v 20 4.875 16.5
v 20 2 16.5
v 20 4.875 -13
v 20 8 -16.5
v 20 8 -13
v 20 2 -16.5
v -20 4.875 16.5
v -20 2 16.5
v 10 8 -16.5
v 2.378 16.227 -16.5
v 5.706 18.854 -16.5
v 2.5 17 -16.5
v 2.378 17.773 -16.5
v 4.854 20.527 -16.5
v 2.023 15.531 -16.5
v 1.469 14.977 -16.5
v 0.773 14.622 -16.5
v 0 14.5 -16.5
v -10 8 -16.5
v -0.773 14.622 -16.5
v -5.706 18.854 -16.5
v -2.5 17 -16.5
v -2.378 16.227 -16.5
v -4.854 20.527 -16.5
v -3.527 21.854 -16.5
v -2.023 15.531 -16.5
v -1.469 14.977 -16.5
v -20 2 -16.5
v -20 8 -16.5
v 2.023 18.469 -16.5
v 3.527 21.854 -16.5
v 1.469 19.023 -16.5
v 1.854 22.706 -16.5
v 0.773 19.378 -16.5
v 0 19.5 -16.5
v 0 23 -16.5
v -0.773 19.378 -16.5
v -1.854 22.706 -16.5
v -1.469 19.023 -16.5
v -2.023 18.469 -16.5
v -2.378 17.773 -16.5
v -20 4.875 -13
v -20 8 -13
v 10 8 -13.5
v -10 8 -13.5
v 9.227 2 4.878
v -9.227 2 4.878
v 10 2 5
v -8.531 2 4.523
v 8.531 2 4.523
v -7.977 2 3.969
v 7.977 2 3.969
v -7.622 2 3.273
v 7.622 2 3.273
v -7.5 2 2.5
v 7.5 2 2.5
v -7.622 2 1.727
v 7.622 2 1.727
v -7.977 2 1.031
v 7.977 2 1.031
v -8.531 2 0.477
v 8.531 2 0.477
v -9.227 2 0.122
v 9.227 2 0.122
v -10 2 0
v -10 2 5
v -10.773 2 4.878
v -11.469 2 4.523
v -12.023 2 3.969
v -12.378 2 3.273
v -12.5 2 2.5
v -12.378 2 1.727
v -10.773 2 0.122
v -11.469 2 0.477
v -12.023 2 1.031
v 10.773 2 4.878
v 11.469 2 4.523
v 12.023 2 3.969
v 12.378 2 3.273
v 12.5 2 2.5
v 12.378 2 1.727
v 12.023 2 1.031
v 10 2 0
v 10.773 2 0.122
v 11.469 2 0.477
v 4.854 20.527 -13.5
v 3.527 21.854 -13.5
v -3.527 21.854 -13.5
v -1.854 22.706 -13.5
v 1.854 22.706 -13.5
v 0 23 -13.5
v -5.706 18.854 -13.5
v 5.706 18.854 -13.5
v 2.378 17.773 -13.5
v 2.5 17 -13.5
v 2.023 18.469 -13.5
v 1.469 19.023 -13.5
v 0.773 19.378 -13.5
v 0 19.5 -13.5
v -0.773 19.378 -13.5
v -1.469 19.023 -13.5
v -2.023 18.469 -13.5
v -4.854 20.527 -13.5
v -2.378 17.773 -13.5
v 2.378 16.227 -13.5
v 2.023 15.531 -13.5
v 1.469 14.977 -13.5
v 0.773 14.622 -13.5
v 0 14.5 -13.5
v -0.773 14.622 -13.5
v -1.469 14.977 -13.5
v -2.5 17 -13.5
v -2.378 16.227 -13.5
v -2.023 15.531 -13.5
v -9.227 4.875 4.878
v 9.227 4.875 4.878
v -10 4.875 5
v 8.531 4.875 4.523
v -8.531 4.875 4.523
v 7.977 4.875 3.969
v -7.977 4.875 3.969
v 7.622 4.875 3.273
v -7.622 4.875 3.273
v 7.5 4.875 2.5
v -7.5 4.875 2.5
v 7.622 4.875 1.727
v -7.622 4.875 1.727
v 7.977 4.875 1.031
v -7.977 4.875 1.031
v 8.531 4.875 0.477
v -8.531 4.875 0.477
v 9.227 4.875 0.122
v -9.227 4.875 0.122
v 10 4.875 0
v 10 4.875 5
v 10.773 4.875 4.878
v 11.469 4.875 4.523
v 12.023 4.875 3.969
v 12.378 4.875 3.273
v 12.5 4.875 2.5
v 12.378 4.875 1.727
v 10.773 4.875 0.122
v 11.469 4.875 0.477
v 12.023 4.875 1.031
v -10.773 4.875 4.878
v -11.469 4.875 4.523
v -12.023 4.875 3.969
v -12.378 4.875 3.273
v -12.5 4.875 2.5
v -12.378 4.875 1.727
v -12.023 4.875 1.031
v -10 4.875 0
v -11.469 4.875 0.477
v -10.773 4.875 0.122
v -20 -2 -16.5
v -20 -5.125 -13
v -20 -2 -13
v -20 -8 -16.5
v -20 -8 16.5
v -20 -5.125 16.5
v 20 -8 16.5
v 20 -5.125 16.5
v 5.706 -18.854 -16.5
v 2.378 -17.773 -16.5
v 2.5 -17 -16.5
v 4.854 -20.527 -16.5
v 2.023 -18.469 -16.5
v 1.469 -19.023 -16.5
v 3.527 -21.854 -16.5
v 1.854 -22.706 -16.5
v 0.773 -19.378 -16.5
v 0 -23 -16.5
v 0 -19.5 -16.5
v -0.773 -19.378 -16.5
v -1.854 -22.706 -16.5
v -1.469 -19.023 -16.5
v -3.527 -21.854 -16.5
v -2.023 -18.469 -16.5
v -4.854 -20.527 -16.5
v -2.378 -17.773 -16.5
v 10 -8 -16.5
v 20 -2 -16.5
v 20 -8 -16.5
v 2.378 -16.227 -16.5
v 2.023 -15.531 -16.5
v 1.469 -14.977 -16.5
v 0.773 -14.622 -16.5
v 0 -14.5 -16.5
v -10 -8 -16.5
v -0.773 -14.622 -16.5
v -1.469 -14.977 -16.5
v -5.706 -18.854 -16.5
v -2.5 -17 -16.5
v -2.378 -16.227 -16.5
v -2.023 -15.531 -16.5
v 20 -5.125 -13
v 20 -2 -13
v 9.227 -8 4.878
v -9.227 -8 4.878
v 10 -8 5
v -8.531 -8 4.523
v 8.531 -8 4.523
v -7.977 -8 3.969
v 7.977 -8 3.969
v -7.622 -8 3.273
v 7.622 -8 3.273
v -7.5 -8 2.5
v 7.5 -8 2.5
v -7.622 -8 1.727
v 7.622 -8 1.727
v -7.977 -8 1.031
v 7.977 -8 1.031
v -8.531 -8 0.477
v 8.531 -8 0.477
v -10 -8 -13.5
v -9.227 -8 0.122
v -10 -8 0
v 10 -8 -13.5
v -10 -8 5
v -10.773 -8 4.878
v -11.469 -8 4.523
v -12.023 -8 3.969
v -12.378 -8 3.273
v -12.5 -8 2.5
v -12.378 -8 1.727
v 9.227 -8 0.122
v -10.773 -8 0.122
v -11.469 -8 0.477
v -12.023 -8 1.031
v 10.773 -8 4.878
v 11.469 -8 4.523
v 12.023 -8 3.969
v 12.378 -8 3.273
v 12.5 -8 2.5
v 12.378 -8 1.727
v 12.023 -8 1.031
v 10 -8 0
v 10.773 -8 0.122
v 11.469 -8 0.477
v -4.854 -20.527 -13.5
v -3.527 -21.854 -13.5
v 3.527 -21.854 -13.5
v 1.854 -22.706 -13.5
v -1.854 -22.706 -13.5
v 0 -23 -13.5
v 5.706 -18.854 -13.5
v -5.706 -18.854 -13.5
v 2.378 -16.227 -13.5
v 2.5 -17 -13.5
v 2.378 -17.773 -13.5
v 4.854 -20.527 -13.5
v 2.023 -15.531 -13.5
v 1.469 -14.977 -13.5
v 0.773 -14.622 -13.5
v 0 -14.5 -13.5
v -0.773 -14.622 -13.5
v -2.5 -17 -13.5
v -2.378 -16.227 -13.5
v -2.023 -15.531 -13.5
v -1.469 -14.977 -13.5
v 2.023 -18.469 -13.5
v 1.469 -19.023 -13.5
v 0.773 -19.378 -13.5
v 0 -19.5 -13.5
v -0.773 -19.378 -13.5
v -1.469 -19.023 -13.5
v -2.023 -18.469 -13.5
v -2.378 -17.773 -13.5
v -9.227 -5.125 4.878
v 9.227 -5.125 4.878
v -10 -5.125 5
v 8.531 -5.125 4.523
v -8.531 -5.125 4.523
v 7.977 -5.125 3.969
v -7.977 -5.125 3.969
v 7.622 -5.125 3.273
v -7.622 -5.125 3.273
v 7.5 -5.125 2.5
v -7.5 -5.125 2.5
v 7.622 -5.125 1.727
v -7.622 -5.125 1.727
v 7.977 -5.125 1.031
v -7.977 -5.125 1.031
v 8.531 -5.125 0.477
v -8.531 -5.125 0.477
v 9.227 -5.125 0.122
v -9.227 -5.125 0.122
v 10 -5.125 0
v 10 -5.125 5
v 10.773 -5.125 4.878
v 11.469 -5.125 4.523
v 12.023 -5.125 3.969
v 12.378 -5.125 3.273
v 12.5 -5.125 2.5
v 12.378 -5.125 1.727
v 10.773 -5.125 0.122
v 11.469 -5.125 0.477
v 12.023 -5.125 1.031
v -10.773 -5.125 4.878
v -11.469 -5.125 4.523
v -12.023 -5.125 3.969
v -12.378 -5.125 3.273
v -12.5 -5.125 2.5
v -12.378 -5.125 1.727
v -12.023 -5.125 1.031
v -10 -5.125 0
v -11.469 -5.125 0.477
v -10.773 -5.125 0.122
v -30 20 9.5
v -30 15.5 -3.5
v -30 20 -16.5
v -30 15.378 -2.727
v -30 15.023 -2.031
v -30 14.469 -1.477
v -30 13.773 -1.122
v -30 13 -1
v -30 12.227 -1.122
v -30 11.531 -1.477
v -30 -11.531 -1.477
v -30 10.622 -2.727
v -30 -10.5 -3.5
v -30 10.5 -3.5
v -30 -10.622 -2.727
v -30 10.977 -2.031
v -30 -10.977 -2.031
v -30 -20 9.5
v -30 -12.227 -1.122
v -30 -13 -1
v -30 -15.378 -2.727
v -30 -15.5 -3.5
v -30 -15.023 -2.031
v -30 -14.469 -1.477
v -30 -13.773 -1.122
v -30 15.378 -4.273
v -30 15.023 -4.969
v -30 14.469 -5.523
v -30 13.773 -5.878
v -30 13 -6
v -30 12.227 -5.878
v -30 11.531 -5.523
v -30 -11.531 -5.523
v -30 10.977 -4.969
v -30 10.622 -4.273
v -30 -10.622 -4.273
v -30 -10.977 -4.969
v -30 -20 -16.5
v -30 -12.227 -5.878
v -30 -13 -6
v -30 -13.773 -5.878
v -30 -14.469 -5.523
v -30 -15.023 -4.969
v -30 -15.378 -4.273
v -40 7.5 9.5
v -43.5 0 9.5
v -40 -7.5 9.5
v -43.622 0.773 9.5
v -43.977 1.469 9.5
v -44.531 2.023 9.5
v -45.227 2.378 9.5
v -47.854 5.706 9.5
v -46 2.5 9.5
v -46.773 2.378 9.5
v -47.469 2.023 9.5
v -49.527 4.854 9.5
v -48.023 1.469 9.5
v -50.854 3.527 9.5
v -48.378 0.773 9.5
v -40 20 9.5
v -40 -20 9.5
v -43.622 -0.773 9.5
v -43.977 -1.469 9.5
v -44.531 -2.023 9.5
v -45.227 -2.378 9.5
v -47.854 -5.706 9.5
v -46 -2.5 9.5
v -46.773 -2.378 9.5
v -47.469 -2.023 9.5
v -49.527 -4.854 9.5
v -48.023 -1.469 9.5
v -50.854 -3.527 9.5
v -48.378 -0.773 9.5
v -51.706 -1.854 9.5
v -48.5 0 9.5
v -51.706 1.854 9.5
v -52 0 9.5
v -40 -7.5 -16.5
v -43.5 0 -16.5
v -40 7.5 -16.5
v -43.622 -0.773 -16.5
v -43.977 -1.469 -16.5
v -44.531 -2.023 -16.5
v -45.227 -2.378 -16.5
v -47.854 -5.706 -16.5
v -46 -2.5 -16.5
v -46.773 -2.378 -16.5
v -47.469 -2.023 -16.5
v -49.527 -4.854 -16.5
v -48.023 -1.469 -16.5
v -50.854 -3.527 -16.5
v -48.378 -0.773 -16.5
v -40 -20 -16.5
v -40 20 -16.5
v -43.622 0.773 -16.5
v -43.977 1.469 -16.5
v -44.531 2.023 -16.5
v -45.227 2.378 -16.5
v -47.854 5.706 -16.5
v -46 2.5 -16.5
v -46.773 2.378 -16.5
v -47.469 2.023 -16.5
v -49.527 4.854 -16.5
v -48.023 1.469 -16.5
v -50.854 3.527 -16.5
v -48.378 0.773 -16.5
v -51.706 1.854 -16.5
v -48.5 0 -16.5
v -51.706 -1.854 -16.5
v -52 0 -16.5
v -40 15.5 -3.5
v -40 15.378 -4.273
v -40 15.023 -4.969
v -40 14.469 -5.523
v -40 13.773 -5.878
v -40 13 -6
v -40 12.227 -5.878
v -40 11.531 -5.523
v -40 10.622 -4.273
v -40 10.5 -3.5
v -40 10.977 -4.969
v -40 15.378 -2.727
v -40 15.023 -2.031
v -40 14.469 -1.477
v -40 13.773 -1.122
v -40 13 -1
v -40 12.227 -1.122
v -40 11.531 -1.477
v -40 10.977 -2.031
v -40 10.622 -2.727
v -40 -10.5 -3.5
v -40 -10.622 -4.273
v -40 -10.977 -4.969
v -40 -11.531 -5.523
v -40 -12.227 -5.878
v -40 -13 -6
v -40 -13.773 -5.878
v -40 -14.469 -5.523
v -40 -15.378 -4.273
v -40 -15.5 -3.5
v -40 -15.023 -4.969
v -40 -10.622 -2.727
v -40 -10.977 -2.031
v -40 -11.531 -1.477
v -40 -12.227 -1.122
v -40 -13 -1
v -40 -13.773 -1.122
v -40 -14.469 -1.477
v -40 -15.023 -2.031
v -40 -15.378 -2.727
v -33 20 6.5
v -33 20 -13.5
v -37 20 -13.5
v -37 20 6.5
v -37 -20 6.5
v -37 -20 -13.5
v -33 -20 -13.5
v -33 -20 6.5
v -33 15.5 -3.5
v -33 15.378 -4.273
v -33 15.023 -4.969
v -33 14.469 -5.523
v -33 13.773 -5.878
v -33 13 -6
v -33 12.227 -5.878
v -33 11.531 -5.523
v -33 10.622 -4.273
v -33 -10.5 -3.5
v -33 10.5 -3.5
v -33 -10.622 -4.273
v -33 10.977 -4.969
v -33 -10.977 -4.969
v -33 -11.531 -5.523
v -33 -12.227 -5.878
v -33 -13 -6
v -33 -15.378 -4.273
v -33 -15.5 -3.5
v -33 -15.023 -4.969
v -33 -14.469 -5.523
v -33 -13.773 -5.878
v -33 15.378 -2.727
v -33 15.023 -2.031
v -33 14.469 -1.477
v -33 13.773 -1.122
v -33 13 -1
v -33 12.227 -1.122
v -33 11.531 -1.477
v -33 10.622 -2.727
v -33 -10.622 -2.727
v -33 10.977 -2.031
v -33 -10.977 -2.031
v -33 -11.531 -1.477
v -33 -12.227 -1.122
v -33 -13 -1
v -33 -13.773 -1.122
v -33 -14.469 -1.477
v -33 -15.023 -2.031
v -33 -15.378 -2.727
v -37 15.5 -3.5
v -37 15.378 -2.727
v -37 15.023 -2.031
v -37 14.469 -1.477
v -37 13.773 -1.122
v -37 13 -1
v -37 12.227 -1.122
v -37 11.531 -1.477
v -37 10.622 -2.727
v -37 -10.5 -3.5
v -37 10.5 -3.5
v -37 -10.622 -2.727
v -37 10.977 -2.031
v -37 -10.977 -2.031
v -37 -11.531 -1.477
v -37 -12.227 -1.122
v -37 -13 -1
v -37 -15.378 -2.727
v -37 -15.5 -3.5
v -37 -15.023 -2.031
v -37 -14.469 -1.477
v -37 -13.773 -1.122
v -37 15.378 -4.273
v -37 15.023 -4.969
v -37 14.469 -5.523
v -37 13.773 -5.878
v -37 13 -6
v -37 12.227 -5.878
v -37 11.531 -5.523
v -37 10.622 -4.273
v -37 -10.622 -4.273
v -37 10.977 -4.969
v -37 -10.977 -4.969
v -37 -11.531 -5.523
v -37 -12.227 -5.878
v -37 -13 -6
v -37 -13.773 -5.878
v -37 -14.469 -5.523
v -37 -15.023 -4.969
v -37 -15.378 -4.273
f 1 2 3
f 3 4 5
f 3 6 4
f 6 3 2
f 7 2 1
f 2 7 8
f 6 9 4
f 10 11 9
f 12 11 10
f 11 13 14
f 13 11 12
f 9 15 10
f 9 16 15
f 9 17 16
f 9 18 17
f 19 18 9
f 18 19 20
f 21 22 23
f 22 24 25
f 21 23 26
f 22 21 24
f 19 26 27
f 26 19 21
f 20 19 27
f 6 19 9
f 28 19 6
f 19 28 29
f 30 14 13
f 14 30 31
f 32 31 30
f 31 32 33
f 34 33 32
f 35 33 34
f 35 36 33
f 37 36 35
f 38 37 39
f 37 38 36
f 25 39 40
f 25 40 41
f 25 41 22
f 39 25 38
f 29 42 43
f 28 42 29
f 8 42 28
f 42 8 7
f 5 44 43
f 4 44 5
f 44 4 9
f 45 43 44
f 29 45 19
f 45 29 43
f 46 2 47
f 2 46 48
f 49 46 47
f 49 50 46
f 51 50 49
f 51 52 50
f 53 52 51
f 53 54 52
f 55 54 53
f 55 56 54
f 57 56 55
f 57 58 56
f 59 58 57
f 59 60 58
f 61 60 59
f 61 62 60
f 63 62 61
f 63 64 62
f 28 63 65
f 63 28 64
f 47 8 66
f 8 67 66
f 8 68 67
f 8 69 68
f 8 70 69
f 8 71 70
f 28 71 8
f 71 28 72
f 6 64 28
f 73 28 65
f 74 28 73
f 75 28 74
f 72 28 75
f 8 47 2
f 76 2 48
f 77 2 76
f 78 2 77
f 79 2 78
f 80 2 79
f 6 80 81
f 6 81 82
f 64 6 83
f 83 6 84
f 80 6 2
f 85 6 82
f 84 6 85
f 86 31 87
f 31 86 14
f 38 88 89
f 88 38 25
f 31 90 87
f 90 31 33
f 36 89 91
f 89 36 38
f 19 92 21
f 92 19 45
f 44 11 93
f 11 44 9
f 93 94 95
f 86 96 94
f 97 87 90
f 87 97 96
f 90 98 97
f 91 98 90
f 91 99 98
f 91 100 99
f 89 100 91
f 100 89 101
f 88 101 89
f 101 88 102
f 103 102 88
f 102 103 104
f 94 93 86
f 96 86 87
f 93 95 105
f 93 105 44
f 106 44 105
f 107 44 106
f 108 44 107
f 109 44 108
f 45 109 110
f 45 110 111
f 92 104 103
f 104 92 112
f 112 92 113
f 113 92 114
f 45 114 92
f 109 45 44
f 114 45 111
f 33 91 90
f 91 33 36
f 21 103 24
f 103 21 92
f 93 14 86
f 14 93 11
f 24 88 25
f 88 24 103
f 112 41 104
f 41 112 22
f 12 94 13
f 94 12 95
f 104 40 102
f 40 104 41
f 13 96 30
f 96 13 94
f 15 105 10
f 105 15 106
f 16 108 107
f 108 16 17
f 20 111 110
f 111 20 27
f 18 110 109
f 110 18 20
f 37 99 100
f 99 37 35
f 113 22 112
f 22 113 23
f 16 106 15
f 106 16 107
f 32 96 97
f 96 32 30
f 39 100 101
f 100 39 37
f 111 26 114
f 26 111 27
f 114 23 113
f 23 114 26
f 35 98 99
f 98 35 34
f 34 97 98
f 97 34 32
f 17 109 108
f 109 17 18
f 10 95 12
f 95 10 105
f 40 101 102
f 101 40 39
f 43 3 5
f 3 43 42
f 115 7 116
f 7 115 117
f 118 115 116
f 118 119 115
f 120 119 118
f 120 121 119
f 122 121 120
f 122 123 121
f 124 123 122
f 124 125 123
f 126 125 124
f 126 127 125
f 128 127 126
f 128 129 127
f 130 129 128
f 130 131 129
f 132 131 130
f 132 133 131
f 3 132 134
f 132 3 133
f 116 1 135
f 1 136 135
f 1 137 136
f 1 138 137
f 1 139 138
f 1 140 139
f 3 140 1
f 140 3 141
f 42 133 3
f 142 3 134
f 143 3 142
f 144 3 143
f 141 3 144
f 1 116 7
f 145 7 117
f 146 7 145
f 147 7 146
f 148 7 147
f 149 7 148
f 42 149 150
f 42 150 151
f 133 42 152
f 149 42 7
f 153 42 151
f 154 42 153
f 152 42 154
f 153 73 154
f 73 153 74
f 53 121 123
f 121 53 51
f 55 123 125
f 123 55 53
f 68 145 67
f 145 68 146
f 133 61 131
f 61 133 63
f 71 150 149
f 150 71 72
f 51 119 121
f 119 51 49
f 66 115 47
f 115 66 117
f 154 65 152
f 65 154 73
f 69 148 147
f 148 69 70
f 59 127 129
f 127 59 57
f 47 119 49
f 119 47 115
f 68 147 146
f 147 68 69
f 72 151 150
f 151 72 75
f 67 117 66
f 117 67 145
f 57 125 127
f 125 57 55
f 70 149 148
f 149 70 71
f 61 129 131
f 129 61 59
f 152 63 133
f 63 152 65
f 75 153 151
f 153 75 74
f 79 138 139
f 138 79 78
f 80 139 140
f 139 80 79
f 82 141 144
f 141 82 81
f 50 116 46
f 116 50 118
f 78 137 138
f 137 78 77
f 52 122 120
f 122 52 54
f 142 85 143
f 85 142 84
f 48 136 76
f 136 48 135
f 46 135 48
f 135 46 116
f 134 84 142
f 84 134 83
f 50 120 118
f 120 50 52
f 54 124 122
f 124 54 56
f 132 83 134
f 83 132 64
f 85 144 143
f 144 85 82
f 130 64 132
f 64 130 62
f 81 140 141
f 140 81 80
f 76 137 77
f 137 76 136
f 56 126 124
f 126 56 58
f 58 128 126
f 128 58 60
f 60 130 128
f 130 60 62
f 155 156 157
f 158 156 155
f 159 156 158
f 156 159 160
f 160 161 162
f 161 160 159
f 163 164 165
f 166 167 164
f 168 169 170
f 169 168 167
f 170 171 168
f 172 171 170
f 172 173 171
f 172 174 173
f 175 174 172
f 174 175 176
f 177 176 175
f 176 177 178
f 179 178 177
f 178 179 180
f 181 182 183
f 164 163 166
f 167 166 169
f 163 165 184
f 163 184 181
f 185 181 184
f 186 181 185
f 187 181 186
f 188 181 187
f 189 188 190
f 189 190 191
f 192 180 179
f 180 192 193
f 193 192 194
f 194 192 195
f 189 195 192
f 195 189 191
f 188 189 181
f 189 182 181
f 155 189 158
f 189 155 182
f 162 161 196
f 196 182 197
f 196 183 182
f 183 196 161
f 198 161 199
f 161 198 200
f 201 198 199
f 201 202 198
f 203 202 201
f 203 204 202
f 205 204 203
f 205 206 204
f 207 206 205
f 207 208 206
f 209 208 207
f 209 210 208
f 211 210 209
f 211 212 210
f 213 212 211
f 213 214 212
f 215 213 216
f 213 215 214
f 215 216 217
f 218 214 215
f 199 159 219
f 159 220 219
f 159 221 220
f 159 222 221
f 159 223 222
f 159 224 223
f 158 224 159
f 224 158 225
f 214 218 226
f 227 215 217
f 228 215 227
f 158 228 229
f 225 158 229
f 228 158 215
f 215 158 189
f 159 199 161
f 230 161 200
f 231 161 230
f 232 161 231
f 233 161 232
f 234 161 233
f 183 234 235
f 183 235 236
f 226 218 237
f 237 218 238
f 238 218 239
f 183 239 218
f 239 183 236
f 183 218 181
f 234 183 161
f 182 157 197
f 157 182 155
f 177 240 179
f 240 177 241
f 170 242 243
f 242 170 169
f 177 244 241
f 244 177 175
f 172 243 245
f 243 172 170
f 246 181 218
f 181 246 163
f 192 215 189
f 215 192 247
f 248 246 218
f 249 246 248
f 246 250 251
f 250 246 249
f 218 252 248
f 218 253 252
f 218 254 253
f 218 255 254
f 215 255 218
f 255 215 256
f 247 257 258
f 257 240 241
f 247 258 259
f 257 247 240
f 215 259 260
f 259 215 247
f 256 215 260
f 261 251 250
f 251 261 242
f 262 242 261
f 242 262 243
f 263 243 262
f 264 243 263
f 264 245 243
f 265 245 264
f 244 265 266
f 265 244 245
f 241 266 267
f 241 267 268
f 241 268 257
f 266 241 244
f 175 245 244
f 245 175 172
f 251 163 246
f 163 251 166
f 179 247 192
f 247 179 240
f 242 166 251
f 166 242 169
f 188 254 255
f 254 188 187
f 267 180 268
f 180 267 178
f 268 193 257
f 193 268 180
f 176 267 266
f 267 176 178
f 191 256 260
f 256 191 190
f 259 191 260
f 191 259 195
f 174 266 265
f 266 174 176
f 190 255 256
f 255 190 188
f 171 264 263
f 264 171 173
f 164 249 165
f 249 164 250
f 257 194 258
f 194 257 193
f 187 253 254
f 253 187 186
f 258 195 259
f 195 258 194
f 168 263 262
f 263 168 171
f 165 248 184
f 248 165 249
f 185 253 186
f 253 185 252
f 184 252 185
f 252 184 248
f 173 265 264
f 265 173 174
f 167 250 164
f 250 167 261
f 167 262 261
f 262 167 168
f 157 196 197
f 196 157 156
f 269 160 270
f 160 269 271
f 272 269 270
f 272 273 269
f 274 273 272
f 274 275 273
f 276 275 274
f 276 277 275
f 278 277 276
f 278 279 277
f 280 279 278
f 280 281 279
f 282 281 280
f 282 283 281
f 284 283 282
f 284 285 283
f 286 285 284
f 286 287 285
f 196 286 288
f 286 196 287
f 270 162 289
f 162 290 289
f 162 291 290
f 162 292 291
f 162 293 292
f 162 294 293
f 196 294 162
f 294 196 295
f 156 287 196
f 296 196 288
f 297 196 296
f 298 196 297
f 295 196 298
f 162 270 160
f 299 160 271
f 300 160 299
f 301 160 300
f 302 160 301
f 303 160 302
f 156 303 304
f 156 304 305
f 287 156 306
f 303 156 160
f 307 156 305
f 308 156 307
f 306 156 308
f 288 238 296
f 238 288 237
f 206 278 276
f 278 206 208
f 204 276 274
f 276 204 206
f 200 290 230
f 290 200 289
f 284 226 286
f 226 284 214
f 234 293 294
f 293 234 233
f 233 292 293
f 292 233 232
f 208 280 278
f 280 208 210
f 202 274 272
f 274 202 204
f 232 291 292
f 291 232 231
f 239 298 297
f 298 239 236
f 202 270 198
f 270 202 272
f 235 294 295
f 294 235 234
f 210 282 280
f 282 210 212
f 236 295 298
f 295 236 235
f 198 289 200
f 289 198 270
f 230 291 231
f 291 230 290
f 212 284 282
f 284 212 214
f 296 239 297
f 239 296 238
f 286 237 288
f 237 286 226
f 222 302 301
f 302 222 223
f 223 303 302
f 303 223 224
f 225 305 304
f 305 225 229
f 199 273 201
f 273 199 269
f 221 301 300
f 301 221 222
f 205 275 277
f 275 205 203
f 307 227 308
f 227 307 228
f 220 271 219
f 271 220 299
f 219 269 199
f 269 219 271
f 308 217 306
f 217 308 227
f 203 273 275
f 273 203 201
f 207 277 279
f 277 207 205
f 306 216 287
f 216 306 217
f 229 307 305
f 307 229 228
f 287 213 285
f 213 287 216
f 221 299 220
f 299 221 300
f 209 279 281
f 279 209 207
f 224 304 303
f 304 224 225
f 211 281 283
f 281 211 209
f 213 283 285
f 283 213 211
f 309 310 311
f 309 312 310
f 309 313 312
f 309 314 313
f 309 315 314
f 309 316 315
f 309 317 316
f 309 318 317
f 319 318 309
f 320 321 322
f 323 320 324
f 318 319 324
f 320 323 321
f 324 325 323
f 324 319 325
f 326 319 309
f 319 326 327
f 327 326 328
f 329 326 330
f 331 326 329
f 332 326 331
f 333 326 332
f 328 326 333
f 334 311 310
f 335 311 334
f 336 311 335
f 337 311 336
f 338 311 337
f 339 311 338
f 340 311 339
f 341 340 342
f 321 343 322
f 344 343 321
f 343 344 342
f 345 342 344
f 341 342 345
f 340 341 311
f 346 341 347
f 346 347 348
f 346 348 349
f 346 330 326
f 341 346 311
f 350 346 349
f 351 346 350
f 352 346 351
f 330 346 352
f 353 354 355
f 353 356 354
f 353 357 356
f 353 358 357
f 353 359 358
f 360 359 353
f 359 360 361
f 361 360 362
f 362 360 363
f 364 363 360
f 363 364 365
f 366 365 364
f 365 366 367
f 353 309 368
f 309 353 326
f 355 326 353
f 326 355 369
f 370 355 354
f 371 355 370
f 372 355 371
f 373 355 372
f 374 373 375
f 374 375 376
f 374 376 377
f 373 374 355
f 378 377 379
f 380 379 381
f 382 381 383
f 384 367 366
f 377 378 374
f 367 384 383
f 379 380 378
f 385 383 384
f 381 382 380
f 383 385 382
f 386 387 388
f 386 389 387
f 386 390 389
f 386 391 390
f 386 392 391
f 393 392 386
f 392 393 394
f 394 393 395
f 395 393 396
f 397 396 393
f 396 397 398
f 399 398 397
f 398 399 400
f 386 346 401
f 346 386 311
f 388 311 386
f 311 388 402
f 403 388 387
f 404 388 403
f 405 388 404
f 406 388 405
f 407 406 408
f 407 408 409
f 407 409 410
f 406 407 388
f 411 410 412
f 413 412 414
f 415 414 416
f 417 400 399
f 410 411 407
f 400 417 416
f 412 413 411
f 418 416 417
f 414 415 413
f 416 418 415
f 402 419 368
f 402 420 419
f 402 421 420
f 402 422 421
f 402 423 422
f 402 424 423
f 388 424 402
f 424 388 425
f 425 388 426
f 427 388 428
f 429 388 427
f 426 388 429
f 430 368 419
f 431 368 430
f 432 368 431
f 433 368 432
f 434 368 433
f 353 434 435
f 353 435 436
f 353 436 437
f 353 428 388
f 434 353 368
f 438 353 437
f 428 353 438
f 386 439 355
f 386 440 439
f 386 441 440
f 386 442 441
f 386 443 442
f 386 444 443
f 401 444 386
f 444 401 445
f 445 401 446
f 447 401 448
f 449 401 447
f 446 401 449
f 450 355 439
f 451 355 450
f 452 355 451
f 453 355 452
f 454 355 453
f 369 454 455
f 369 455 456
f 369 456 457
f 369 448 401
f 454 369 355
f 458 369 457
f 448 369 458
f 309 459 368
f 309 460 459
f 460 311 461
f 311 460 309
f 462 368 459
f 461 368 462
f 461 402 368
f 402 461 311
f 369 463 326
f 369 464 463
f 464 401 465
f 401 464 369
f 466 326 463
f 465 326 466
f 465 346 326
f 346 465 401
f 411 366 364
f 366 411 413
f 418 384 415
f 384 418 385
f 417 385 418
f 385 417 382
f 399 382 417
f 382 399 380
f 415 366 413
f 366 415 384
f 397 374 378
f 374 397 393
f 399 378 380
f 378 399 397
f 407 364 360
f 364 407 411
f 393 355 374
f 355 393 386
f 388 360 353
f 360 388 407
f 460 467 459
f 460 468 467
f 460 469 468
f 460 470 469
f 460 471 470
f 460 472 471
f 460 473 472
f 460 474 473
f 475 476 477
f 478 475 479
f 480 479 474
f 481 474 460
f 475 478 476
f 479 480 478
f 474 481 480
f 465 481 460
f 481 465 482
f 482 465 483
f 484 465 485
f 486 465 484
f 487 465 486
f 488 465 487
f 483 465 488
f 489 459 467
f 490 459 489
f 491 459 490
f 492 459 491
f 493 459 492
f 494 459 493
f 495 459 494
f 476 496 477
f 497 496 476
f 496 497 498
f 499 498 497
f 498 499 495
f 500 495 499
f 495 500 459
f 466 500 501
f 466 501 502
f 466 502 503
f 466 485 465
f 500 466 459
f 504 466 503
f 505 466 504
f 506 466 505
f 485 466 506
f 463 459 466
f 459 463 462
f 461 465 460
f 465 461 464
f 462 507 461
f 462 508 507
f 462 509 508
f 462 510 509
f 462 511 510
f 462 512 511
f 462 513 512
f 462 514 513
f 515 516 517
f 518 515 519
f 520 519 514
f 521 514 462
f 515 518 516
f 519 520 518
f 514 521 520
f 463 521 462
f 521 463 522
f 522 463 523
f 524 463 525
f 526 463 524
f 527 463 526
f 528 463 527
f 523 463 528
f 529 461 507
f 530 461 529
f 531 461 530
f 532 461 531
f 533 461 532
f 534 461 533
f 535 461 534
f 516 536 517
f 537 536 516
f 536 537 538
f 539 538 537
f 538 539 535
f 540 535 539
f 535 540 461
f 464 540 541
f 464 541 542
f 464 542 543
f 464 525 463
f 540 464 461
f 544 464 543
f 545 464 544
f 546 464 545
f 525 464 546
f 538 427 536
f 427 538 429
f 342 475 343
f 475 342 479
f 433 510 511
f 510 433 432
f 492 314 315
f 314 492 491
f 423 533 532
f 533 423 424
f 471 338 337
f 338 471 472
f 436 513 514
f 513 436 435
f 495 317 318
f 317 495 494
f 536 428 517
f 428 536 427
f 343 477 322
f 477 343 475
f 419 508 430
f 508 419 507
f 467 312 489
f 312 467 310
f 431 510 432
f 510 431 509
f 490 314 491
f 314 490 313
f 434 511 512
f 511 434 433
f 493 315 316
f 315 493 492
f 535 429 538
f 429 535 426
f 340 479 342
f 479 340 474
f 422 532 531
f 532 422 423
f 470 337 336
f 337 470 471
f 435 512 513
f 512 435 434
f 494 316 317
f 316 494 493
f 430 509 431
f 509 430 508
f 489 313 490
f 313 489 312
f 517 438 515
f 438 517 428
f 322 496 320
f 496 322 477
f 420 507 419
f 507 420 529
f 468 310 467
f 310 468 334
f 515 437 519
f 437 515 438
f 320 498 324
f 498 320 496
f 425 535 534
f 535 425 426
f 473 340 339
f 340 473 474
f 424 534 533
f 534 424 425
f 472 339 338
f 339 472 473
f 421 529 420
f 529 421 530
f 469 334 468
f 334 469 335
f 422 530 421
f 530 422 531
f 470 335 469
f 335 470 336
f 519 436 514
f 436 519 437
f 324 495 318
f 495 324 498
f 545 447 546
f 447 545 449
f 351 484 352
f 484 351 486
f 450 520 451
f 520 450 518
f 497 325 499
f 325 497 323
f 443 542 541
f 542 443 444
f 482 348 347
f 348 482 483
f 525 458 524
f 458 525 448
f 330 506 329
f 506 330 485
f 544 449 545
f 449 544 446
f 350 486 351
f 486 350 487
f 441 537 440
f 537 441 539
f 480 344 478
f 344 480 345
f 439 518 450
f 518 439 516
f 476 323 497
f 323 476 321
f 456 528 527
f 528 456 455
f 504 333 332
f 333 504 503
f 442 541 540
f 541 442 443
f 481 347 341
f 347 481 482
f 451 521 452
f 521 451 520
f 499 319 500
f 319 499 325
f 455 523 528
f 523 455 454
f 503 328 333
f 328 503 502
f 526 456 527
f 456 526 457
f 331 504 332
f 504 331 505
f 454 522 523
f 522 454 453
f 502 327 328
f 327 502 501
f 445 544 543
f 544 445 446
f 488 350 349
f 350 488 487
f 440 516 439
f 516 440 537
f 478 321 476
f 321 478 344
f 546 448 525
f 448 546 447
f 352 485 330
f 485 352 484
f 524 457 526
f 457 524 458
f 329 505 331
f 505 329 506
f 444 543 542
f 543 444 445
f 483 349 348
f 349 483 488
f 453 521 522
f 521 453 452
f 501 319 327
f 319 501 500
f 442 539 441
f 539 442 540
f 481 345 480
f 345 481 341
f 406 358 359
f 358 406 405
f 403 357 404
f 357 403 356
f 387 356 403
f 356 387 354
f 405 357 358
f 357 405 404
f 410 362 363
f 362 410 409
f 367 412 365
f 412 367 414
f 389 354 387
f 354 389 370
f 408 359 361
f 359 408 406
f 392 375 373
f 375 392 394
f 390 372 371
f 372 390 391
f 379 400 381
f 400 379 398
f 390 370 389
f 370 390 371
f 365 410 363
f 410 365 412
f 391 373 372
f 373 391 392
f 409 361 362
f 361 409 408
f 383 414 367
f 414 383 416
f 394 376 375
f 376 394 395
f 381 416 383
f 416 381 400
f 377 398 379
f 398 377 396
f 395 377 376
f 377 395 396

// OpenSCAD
//Width of the metal bar in mm
BarWidth=19;

//Thickness of the metal bar in mm
BarThickness=3;

/*[hidden]*/

/*
Use 4mm diameter nuts and bolts for all attachments! 4mm diameter screws also.
*/

$fn=20;

//1st half of the rocker-hinge mount bracket
translate([0,5,0])
difference(){

union(){
	//bottom plate
	cube([40,6,BarWidth+14],center=true);

	//structure for axle hole
	hull(){
		translate([0,12,-(((BarWidth+14)/2)-1.5)])cylinder(r=6,h=3,center=true);
		translate([0,2,-(((BarWidth+14)/2)-1.5)])cube([20,2,3],center=true);
	}
}

	//axle hole
	translate([0,12,-(((BarWidth+14)/2)-1.5)])cylinder(r=2.5,h=4,center=true);
	
	//cut-away for other half
	translate([0,3,3.5])cube([42,6.25,BarWidth+14],center=true);

	//screw holes
	translate([-10,0,2.5])rotate([90,0,0])cylinder(r=2.5,h=10,center=true);
	translate([10,0,2.5])rotate([90,0,0])cylinder(r=2.5,h=10,center=true);

}


//2nd half of the rocker-hinge mount bracket
rotate([0,0,180])
translate([0,5,0])
difference(){

union(){
	//bottom plate
	cube([40,6,BarWidth+14],center=true);

	//structure for axle hole
	hull(){
		translate([0,12,-(((BarWidth+14)/2)-1.5)])cylinder(r=6,h=3,center=true);
		translate([0,2,-(((BarWidth+14)/2)-1.5)])cube([20,2,3],center=true);
	}
}

	//axle hole
	translate([0,12,-(((BarWidth+14)/2)-1.5)])cylinder(r=2.5,h=4,center=true);
	
	//cut-away for other half
	translate([0,-3,3.5])cube([42,6.25,BarWidth+14],center=true);

	//screw holes
	translate([-10,0,2.5])rotate([90,0,0])cylinder(r=2.5,h=10,center=true);
	translate([10,0,2.5])rotate([90,0,0])cylinder(r=2.5,h=10,center=true);

}


//Rocker hinge that slides over bar

difference(){
	//main geometry
	union(){
		translate([-35,0,-(((BarWidth+14)/2)-13)])
		cube([BarThickness+7,40,BarWidth+7],center=true);
		hull(){
			translate([-35-(((BarThickness+7)/2)+6),0,-(((BarWidth+14)/2)-13)])
			cylinder(r=6,h=BarWidth+7,center=true);
			translate([-35-(((BarThickness+7)/2)-1.5),0,-(((BarWidth+14)/2)-13)])
			cube([3,15,BarWidth+7],center=true);
		}
	}

	//hole for bar
	translate([-35,0,-(((BarWidth+14)/2)-13)])
	cube([BarThickness+1,42,BarWidth+1],center=true);

	//holes for bolts
	translate([-35,13,-(((BarWidth+14)/2)-13)])rotate([0,90,0])
	cylinder(r=2.5,h=BarThickness+10,center=true);
	
	translate([-35,-13,-(((BarWidth+14)/2)-13)])rotate([0,90,0])
	cylinder(r=2.5,h=BarThickness+10,center=true);

	//hole for axle
	translate([-35-(((BarThickness+7)/2)+6),0,-(((BarWidth+14)/2)-13)])
	cylinder(r=2.5,h=BarWidth+9,center=true);
}
